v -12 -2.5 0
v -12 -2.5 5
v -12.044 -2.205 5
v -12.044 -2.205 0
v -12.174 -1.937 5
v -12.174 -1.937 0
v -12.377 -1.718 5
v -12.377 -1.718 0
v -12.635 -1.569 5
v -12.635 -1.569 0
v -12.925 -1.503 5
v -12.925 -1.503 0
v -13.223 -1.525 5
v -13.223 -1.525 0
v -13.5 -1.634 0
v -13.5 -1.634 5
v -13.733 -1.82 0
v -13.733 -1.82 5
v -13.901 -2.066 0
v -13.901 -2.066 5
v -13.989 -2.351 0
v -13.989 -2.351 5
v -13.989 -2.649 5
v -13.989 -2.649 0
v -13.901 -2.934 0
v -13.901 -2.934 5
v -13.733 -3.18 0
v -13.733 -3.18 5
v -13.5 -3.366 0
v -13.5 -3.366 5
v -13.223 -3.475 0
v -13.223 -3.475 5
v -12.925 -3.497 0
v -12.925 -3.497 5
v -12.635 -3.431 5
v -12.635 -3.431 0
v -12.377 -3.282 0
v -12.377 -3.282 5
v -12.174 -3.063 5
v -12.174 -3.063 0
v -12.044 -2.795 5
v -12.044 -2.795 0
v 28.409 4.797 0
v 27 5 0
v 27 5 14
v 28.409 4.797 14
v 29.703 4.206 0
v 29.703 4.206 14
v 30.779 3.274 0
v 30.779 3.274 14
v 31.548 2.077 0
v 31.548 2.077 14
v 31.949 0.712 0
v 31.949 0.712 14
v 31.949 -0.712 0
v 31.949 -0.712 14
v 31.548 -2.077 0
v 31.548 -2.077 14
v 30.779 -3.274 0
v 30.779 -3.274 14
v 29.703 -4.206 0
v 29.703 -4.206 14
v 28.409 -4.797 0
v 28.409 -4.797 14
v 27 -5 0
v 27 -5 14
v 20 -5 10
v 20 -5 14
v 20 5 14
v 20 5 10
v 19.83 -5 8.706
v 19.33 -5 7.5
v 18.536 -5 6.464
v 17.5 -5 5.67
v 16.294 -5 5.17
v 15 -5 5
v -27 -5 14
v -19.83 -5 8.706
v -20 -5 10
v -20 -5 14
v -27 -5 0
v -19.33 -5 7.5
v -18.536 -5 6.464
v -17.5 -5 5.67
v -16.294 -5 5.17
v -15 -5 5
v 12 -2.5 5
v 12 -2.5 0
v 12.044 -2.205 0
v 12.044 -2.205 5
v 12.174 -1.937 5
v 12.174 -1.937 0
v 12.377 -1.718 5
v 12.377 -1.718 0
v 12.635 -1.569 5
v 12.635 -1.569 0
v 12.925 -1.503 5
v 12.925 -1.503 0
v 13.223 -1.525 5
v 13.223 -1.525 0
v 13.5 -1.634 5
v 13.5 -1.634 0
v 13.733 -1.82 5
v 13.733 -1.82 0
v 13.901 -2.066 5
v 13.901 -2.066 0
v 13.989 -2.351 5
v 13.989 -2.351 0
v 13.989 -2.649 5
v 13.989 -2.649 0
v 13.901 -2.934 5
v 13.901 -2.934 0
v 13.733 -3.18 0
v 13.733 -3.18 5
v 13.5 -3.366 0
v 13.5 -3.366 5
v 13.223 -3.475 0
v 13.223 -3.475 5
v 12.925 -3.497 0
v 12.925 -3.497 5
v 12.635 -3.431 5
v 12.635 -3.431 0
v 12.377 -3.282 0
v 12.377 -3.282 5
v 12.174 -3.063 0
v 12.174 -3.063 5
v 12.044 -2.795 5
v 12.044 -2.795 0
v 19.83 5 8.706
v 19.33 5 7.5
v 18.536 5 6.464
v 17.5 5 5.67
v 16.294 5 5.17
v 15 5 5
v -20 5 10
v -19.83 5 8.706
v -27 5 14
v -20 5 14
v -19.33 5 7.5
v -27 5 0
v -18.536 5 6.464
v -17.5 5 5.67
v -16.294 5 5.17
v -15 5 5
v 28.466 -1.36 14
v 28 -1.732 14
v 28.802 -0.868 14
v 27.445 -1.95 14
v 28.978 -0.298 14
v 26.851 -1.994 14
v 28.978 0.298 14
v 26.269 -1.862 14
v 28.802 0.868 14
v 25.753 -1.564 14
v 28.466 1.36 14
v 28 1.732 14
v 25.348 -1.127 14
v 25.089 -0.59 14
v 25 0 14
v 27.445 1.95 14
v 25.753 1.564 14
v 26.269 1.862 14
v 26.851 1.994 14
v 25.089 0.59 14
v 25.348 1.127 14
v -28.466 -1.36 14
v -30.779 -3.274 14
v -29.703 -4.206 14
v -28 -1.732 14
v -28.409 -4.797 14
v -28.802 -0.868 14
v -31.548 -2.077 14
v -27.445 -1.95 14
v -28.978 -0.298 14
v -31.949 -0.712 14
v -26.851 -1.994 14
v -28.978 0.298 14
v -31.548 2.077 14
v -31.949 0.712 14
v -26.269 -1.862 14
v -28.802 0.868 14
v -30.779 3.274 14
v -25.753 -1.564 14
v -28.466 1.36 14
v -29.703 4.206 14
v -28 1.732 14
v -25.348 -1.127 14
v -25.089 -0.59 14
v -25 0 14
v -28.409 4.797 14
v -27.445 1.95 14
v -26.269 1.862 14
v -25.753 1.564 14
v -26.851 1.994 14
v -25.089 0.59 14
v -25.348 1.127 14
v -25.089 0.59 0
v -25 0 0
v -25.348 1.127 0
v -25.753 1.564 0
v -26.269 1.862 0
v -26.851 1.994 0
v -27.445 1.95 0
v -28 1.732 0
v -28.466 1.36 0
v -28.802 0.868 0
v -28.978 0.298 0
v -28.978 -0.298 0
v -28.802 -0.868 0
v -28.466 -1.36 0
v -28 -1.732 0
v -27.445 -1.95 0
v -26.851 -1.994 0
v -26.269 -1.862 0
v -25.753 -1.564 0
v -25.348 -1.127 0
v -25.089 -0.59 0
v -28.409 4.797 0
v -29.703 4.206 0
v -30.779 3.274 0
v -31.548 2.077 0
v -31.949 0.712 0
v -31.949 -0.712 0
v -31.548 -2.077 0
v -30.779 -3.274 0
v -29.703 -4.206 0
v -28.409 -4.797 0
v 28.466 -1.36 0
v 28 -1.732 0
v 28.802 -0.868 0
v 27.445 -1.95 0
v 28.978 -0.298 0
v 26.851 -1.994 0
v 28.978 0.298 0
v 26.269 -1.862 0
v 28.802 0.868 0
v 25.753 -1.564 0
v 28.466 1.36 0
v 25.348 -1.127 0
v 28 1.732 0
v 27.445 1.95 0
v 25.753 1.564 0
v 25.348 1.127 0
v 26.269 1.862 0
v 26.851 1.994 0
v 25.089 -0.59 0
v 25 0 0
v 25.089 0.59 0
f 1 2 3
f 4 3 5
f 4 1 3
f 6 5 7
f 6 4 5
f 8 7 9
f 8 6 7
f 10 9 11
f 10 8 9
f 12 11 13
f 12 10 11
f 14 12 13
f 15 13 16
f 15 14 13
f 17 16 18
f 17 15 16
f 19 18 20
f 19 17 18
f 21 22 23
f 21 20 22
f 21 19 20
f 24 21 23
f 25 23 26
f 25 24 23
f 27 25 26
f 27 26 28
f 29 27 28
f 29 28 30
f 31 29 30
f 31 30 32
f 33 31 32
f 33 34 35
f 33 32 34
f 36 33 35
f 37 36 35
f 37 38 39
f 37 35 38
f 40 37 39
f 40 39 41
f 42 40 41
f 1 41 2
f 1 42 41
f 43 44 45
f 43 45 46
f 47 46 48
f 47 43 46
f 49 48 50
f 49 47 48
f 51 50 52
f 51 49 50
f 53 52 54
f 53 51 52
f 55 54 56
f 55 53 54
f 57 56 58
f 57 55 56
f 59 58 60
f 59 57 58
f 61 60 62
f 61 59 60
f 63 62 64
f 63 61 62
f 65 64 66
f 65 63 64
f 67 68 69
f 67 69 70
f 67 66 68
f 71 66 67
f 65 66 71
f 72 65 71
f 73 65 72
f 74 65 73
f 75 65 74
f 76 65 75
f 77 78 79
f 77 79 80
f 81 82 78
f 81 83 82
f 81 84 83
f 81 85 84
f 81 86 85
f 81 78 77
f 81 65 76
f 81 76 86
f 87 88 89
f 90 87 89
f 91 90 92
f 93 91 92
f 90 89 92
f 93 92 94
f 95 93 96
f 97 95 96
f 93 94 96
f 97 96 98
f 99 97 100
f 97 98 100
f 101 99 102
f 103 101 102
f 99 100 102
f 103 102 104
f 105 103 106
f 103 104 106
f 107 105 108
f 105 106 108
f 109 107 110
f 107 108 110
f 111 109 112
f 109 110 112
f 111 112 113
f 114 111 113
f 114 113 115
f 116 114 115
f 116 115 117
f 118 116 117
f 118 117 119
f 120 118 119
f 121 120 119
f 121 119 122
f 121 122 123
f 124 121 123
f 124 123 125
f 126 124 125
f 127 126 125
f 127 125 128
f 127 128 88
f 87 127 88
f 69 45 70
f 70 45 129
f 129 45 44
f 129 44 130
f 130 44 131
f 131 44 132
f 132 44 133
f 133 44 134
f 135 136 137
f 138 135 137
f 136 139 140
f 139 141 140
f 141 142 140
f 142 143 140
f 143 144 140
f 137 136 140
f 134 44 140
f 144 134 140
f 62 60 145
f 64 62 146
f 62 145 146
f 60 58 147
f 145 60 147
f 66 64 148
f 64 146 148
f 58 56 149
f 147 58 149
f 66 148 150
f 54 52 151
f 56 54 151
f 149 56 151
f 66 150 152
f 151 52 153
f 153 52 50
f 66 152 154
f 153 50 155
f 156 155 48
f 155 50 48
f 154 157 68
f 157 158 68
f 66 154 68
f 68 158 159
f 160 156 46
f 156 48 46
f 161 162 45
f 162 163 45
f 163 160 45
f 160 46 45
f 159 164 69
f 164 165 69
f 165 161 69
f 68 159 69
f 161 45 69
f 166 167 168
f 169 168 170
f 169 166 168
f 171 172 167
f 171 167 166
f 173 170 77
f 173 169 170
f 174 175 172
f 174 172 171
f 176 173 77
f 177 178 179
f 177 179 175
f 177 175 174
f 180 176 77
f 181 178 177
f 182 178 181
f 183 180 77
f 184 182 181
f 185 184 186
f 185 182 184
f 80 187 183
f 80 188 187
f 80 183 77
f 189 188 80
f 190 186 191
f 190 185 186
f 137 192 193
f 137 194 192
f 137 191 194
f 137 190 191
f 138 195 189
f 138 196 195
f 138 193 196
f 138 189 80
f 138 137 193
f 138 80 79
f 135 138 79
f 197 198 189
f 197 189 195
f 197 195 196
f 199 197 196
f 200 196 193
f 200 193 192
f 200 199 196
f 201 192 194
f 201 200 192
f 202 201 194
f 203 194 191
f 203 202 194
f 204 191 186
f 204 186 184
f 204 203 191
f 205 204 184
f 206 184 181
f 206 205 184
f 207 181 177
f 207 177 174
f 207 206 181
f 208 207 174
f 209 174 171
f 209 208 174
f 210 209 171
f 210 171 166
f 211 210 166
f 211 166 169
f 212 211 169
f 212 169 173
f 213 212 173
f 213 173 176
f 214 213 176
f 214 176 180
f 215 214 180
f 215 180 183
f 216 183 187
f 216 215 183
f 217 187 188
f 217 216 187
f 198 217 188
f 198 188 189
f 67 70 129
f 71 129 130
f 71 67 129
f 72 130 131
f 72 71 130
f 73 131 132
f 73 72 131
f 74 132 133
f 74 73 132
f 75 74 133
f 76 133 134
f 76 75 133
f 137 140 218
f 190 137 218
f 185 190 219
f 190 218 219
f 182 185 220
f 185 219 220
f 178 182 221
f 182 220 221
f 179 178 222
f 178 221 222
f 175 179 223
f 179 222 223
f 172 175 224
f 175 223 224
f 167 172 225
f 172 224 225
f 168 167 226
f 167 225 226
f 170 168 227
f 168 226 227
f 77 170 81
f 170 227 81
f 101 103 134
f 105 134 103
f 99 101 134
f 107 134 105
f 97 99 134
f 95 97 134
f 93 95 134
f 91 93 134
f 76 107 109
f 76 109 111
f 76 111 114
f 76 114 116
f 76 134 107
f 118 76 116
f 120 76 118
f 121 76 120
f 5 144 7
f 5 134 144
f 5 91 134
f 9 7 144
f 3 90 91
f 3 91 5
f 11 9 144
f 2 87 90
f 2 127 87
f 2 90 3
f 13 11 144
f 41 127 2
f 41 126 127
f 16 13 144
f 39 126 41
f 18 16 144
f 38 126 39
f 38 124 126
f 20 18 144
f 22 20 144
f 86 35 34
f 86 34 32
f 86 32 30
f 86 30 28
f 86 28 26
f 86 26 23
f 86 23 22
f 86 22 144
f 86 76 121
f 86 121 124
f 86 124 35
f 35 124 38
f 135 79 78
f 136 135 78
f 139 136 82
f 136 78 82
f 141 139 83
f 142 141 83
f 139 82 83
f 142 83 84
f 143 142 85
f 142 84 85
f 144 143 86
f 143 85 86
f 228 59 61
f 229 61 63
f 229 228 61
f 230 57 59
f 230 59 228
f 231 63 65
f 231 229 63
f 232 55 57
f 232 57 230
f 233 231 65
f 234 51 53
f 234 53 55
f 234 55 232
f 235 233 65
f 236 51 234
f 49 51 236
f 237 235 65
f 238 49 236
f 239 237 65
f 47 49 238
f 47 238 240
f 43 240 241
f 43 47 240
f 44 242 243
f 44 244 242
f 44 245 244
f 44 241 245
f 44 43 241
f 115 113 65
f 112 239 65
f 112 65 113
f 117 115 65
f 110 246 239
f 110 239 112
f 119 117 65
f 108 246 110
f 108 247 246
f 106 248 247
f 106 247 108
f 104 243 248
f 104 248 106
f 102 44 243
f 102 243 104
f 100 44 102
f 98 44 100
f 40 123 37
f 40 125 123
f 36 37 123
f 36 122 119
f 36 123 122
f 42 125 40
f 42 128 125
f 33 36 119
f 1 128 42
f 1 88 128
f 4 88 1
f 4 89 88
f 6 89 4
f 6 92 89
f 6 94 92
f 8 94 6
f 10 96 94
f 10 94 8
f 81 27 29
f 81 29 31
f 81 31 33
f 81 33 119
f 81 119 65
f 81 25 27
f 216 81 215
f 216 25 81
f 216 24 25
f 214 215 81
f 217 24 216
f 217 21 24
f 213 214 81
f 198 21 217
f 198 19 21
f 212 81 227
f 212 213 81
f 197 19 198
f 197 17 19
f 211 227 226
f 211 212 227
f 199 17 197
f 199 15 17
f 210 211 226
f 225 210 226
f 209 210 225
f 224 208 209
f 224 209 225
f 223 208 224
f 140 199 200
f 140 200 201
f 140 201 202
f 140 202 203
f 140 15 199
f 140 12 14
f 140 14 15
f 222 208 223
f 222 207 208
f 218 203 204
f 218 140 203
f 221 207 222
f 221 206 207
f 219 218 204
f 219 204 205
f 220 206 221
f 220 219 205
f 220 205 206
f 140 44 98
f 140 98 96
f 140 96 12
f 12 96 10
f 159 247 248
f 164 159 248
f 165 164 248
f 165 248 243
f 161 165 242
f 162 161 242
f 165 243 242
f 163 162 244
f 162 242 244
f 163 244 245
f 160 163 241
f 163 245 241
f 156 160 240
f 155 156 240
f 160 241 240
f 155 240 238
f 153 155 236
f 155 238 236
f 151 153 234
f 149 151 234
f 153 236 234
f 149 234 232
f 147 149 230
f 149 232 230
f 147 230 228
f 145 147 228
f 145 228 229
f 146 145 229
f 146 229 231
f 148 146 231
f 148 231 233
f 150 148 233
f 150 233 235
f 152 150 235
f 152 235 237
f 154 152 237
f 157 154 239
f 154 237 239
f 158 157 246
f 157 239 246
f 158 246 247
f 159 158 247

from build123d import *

# Parameters (mm, degrees)
SKETCH_R     = 2
SKETCH_R_2   = 1
PAD_DEPTH    = 14
POCKET_DEPTH = 82.664608


with BuildPart() as part:
    # Sketch → Pad (new body)
    with BuildSketch(Plane.XY):
        with BuildLine():
            ThreePointArc((-26.999971, 5), (-32, 0), (-26.999971, -5))
            Line((-26.999971, -5), (0, -5))
            Line((0, -5), (0, 5))
            Line((-26.999971, 5), (0, 5))
        make_face()
        with Locations((-27, 0)):
            Circle(SKETCH_R, mode=Mode.SUBTRACT)
        with Locations((-13, -2.5)):
            Circle(SKETCH_R_2, mode=Mode.SUBTRACT)
    pad = extrude(amount=PAD_DEPTH)

    # Sketch001 → Pocket (cut, through all)
    with BuildSketch(Plane.XZ.offset(5)):
        with BuildLine():
            Line((-20, 14), (-20, 10.000019))
            ThreePointArc((-20, 10.000019), (-18.535534, 6.464466), (-14.999981, 5))
            Line((0, 5), (-14.999981, 5))
            Line((0, 14), (0, 5))
            Line((-20, 14), (0, 14))
        make_face()
    pocket = extrude(amount=-POCKET_DEPTH, mode=Mode.SUBTRACT)

    # Mirrored: Pad, Pocket across Sketch001 V_Axis
    add(pad.mirror(Plane(origin=(0, -5, 0), x_dir=(0, -1, 0), z_dir=(1, 0, 0))))
    add(pocket.mirror(Plane(origin=(0, -5, 0), x_dir=(0, -1, 0), z_dir=(1, 0, 0))), mode=Mode.SUBTRACT)


solid = part.part
